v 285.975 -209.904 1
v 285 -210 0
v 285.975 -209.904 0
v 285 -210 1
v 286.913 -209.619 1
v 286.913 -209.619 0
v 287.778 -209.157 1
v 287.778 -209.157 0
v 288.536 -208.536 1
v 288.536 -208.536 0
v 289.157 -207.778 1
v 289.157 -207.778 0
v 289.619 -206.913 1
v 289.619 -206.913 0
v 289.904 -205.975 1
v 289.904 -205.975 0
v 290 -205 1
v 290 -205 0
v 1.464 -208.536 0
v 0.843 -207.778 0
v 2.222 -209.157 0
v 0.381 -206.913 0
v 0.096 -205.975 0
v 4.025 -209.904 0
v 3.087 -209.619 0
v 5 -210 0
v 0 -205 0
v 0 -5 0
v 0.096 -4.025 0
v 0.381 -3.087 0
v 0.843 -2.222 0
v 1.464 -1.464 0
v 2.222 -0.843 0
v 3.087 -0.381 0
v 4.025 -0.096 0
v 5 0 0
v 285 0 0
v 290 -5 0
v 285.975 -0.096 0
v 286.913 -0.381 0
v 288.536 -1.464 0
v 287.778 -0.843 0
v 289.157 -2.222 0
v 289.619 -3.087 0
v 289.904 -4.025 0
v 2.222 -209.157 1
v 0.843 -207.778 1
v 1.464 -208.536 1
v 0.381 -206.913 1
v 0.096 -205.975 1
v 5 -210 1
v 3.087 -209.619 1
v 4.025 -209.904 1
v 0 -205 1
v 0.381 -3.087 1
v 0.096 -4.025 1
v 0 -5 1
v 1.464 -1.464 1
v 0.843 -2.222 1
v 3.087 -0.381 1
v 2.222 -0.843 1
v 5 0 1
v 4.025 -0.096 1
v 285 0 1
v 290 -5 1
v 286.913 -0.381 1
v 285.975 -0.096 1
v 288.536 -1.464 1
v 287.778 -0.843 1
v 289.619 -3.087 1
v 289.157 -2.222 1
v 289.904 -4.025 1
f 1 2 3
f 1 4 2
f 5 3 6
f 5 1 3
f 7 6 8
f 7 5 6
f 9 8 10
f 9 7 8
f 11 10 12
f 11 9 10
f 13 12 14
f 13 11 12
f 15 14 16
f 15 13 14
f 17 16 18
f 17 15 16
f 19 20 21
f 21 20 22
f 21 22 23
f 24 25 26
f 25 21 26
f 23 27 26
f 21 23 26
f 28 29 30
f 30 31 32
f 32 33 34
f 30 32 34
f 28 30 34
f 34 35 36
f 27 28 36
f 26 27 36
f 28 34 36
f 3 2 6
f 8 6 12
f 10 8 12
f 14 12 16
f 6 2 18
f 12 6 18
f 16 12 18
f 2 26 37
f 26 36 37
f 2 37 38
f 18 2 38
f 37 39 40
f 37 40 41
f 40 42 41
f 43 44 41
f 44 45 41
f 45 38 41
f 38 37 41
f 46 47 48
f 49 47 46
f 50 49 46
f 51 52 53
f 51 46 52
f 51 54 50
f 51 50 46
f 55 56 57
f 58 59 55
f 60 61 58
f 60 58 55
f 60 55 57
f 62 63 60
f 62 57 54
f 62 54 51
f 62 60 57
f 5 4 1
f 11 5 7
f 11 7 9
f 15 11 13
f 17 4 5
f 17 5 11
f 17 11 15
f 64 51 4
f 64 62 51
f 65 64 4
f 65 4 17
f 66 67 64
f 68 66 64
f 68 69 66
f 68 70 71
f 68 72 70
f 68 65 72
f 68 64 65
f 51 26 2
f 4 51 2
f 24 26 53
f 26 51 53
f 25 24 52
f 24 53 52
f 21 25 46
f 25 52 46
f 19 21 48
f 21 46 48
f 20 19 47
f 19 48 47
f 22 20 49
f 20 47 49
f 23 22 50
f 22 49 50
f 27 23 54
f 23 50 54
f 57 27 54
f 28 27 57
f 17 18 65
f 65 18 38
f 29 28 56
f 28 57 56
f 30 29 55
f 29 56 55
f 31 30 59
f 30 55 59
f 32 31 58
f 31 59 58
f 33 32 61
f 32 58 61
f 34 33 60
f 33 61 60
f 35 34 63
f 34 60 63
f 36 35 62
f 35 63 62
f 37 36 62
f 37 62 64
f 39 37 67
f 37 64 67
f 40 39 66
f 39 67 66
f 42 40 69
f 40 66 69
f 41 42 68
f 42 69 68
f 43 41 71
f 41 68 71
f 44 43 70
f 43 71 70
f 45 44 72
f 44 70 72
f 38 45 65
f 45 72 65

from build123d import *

# Parameters (mm, degrees)
SKETCH_W    = 290
SKETCH_H    = 210
PAD_DEPTH   = 1
FILLET_R    = 5
FILLET001_R = 5
FILLET002_R = 5
FILLET003_R = 5


with BuildPart() as part:
    # Sketch → Pad (new body)
    with BuildSketch(Plane.XY):
        with Locations((145, -105)):
            Rectangle(SKETCH_W, SKETCH_H)
    extrude(amount=PAD_DEPTH)

    # Fillet
    fillet_edges = [part.edges().sort_by_distance(p)[0] for p in [
        (290, -210, 0.5),
    ]]
    fillet(fillet_edges, radius=FILLET_R)

    # Fillet001
    fillet001_edges = [part.edges().sort_by_distance(p)[0] for p in [
        (0, -210, 0.5),
    ]]
    fillet(fillet001_edges, radius=FILLET001_R)

    # Fillet002
    fillet002_edges = [part.edges().sort_by_distance(p)[0] for p in [
        (0, 0, 0.5),
    ]]
    fillet(fillet002_edges, radius=FILLET002_R)

    # Fillet003
    fillet003_edges = [part.edges().sort_by_distance(p)[0] for p in [
        (290, 0, 0.5),
    ]]
    fillet(fillet003_edges, radius=FILLET003_R)


solid = part.part
